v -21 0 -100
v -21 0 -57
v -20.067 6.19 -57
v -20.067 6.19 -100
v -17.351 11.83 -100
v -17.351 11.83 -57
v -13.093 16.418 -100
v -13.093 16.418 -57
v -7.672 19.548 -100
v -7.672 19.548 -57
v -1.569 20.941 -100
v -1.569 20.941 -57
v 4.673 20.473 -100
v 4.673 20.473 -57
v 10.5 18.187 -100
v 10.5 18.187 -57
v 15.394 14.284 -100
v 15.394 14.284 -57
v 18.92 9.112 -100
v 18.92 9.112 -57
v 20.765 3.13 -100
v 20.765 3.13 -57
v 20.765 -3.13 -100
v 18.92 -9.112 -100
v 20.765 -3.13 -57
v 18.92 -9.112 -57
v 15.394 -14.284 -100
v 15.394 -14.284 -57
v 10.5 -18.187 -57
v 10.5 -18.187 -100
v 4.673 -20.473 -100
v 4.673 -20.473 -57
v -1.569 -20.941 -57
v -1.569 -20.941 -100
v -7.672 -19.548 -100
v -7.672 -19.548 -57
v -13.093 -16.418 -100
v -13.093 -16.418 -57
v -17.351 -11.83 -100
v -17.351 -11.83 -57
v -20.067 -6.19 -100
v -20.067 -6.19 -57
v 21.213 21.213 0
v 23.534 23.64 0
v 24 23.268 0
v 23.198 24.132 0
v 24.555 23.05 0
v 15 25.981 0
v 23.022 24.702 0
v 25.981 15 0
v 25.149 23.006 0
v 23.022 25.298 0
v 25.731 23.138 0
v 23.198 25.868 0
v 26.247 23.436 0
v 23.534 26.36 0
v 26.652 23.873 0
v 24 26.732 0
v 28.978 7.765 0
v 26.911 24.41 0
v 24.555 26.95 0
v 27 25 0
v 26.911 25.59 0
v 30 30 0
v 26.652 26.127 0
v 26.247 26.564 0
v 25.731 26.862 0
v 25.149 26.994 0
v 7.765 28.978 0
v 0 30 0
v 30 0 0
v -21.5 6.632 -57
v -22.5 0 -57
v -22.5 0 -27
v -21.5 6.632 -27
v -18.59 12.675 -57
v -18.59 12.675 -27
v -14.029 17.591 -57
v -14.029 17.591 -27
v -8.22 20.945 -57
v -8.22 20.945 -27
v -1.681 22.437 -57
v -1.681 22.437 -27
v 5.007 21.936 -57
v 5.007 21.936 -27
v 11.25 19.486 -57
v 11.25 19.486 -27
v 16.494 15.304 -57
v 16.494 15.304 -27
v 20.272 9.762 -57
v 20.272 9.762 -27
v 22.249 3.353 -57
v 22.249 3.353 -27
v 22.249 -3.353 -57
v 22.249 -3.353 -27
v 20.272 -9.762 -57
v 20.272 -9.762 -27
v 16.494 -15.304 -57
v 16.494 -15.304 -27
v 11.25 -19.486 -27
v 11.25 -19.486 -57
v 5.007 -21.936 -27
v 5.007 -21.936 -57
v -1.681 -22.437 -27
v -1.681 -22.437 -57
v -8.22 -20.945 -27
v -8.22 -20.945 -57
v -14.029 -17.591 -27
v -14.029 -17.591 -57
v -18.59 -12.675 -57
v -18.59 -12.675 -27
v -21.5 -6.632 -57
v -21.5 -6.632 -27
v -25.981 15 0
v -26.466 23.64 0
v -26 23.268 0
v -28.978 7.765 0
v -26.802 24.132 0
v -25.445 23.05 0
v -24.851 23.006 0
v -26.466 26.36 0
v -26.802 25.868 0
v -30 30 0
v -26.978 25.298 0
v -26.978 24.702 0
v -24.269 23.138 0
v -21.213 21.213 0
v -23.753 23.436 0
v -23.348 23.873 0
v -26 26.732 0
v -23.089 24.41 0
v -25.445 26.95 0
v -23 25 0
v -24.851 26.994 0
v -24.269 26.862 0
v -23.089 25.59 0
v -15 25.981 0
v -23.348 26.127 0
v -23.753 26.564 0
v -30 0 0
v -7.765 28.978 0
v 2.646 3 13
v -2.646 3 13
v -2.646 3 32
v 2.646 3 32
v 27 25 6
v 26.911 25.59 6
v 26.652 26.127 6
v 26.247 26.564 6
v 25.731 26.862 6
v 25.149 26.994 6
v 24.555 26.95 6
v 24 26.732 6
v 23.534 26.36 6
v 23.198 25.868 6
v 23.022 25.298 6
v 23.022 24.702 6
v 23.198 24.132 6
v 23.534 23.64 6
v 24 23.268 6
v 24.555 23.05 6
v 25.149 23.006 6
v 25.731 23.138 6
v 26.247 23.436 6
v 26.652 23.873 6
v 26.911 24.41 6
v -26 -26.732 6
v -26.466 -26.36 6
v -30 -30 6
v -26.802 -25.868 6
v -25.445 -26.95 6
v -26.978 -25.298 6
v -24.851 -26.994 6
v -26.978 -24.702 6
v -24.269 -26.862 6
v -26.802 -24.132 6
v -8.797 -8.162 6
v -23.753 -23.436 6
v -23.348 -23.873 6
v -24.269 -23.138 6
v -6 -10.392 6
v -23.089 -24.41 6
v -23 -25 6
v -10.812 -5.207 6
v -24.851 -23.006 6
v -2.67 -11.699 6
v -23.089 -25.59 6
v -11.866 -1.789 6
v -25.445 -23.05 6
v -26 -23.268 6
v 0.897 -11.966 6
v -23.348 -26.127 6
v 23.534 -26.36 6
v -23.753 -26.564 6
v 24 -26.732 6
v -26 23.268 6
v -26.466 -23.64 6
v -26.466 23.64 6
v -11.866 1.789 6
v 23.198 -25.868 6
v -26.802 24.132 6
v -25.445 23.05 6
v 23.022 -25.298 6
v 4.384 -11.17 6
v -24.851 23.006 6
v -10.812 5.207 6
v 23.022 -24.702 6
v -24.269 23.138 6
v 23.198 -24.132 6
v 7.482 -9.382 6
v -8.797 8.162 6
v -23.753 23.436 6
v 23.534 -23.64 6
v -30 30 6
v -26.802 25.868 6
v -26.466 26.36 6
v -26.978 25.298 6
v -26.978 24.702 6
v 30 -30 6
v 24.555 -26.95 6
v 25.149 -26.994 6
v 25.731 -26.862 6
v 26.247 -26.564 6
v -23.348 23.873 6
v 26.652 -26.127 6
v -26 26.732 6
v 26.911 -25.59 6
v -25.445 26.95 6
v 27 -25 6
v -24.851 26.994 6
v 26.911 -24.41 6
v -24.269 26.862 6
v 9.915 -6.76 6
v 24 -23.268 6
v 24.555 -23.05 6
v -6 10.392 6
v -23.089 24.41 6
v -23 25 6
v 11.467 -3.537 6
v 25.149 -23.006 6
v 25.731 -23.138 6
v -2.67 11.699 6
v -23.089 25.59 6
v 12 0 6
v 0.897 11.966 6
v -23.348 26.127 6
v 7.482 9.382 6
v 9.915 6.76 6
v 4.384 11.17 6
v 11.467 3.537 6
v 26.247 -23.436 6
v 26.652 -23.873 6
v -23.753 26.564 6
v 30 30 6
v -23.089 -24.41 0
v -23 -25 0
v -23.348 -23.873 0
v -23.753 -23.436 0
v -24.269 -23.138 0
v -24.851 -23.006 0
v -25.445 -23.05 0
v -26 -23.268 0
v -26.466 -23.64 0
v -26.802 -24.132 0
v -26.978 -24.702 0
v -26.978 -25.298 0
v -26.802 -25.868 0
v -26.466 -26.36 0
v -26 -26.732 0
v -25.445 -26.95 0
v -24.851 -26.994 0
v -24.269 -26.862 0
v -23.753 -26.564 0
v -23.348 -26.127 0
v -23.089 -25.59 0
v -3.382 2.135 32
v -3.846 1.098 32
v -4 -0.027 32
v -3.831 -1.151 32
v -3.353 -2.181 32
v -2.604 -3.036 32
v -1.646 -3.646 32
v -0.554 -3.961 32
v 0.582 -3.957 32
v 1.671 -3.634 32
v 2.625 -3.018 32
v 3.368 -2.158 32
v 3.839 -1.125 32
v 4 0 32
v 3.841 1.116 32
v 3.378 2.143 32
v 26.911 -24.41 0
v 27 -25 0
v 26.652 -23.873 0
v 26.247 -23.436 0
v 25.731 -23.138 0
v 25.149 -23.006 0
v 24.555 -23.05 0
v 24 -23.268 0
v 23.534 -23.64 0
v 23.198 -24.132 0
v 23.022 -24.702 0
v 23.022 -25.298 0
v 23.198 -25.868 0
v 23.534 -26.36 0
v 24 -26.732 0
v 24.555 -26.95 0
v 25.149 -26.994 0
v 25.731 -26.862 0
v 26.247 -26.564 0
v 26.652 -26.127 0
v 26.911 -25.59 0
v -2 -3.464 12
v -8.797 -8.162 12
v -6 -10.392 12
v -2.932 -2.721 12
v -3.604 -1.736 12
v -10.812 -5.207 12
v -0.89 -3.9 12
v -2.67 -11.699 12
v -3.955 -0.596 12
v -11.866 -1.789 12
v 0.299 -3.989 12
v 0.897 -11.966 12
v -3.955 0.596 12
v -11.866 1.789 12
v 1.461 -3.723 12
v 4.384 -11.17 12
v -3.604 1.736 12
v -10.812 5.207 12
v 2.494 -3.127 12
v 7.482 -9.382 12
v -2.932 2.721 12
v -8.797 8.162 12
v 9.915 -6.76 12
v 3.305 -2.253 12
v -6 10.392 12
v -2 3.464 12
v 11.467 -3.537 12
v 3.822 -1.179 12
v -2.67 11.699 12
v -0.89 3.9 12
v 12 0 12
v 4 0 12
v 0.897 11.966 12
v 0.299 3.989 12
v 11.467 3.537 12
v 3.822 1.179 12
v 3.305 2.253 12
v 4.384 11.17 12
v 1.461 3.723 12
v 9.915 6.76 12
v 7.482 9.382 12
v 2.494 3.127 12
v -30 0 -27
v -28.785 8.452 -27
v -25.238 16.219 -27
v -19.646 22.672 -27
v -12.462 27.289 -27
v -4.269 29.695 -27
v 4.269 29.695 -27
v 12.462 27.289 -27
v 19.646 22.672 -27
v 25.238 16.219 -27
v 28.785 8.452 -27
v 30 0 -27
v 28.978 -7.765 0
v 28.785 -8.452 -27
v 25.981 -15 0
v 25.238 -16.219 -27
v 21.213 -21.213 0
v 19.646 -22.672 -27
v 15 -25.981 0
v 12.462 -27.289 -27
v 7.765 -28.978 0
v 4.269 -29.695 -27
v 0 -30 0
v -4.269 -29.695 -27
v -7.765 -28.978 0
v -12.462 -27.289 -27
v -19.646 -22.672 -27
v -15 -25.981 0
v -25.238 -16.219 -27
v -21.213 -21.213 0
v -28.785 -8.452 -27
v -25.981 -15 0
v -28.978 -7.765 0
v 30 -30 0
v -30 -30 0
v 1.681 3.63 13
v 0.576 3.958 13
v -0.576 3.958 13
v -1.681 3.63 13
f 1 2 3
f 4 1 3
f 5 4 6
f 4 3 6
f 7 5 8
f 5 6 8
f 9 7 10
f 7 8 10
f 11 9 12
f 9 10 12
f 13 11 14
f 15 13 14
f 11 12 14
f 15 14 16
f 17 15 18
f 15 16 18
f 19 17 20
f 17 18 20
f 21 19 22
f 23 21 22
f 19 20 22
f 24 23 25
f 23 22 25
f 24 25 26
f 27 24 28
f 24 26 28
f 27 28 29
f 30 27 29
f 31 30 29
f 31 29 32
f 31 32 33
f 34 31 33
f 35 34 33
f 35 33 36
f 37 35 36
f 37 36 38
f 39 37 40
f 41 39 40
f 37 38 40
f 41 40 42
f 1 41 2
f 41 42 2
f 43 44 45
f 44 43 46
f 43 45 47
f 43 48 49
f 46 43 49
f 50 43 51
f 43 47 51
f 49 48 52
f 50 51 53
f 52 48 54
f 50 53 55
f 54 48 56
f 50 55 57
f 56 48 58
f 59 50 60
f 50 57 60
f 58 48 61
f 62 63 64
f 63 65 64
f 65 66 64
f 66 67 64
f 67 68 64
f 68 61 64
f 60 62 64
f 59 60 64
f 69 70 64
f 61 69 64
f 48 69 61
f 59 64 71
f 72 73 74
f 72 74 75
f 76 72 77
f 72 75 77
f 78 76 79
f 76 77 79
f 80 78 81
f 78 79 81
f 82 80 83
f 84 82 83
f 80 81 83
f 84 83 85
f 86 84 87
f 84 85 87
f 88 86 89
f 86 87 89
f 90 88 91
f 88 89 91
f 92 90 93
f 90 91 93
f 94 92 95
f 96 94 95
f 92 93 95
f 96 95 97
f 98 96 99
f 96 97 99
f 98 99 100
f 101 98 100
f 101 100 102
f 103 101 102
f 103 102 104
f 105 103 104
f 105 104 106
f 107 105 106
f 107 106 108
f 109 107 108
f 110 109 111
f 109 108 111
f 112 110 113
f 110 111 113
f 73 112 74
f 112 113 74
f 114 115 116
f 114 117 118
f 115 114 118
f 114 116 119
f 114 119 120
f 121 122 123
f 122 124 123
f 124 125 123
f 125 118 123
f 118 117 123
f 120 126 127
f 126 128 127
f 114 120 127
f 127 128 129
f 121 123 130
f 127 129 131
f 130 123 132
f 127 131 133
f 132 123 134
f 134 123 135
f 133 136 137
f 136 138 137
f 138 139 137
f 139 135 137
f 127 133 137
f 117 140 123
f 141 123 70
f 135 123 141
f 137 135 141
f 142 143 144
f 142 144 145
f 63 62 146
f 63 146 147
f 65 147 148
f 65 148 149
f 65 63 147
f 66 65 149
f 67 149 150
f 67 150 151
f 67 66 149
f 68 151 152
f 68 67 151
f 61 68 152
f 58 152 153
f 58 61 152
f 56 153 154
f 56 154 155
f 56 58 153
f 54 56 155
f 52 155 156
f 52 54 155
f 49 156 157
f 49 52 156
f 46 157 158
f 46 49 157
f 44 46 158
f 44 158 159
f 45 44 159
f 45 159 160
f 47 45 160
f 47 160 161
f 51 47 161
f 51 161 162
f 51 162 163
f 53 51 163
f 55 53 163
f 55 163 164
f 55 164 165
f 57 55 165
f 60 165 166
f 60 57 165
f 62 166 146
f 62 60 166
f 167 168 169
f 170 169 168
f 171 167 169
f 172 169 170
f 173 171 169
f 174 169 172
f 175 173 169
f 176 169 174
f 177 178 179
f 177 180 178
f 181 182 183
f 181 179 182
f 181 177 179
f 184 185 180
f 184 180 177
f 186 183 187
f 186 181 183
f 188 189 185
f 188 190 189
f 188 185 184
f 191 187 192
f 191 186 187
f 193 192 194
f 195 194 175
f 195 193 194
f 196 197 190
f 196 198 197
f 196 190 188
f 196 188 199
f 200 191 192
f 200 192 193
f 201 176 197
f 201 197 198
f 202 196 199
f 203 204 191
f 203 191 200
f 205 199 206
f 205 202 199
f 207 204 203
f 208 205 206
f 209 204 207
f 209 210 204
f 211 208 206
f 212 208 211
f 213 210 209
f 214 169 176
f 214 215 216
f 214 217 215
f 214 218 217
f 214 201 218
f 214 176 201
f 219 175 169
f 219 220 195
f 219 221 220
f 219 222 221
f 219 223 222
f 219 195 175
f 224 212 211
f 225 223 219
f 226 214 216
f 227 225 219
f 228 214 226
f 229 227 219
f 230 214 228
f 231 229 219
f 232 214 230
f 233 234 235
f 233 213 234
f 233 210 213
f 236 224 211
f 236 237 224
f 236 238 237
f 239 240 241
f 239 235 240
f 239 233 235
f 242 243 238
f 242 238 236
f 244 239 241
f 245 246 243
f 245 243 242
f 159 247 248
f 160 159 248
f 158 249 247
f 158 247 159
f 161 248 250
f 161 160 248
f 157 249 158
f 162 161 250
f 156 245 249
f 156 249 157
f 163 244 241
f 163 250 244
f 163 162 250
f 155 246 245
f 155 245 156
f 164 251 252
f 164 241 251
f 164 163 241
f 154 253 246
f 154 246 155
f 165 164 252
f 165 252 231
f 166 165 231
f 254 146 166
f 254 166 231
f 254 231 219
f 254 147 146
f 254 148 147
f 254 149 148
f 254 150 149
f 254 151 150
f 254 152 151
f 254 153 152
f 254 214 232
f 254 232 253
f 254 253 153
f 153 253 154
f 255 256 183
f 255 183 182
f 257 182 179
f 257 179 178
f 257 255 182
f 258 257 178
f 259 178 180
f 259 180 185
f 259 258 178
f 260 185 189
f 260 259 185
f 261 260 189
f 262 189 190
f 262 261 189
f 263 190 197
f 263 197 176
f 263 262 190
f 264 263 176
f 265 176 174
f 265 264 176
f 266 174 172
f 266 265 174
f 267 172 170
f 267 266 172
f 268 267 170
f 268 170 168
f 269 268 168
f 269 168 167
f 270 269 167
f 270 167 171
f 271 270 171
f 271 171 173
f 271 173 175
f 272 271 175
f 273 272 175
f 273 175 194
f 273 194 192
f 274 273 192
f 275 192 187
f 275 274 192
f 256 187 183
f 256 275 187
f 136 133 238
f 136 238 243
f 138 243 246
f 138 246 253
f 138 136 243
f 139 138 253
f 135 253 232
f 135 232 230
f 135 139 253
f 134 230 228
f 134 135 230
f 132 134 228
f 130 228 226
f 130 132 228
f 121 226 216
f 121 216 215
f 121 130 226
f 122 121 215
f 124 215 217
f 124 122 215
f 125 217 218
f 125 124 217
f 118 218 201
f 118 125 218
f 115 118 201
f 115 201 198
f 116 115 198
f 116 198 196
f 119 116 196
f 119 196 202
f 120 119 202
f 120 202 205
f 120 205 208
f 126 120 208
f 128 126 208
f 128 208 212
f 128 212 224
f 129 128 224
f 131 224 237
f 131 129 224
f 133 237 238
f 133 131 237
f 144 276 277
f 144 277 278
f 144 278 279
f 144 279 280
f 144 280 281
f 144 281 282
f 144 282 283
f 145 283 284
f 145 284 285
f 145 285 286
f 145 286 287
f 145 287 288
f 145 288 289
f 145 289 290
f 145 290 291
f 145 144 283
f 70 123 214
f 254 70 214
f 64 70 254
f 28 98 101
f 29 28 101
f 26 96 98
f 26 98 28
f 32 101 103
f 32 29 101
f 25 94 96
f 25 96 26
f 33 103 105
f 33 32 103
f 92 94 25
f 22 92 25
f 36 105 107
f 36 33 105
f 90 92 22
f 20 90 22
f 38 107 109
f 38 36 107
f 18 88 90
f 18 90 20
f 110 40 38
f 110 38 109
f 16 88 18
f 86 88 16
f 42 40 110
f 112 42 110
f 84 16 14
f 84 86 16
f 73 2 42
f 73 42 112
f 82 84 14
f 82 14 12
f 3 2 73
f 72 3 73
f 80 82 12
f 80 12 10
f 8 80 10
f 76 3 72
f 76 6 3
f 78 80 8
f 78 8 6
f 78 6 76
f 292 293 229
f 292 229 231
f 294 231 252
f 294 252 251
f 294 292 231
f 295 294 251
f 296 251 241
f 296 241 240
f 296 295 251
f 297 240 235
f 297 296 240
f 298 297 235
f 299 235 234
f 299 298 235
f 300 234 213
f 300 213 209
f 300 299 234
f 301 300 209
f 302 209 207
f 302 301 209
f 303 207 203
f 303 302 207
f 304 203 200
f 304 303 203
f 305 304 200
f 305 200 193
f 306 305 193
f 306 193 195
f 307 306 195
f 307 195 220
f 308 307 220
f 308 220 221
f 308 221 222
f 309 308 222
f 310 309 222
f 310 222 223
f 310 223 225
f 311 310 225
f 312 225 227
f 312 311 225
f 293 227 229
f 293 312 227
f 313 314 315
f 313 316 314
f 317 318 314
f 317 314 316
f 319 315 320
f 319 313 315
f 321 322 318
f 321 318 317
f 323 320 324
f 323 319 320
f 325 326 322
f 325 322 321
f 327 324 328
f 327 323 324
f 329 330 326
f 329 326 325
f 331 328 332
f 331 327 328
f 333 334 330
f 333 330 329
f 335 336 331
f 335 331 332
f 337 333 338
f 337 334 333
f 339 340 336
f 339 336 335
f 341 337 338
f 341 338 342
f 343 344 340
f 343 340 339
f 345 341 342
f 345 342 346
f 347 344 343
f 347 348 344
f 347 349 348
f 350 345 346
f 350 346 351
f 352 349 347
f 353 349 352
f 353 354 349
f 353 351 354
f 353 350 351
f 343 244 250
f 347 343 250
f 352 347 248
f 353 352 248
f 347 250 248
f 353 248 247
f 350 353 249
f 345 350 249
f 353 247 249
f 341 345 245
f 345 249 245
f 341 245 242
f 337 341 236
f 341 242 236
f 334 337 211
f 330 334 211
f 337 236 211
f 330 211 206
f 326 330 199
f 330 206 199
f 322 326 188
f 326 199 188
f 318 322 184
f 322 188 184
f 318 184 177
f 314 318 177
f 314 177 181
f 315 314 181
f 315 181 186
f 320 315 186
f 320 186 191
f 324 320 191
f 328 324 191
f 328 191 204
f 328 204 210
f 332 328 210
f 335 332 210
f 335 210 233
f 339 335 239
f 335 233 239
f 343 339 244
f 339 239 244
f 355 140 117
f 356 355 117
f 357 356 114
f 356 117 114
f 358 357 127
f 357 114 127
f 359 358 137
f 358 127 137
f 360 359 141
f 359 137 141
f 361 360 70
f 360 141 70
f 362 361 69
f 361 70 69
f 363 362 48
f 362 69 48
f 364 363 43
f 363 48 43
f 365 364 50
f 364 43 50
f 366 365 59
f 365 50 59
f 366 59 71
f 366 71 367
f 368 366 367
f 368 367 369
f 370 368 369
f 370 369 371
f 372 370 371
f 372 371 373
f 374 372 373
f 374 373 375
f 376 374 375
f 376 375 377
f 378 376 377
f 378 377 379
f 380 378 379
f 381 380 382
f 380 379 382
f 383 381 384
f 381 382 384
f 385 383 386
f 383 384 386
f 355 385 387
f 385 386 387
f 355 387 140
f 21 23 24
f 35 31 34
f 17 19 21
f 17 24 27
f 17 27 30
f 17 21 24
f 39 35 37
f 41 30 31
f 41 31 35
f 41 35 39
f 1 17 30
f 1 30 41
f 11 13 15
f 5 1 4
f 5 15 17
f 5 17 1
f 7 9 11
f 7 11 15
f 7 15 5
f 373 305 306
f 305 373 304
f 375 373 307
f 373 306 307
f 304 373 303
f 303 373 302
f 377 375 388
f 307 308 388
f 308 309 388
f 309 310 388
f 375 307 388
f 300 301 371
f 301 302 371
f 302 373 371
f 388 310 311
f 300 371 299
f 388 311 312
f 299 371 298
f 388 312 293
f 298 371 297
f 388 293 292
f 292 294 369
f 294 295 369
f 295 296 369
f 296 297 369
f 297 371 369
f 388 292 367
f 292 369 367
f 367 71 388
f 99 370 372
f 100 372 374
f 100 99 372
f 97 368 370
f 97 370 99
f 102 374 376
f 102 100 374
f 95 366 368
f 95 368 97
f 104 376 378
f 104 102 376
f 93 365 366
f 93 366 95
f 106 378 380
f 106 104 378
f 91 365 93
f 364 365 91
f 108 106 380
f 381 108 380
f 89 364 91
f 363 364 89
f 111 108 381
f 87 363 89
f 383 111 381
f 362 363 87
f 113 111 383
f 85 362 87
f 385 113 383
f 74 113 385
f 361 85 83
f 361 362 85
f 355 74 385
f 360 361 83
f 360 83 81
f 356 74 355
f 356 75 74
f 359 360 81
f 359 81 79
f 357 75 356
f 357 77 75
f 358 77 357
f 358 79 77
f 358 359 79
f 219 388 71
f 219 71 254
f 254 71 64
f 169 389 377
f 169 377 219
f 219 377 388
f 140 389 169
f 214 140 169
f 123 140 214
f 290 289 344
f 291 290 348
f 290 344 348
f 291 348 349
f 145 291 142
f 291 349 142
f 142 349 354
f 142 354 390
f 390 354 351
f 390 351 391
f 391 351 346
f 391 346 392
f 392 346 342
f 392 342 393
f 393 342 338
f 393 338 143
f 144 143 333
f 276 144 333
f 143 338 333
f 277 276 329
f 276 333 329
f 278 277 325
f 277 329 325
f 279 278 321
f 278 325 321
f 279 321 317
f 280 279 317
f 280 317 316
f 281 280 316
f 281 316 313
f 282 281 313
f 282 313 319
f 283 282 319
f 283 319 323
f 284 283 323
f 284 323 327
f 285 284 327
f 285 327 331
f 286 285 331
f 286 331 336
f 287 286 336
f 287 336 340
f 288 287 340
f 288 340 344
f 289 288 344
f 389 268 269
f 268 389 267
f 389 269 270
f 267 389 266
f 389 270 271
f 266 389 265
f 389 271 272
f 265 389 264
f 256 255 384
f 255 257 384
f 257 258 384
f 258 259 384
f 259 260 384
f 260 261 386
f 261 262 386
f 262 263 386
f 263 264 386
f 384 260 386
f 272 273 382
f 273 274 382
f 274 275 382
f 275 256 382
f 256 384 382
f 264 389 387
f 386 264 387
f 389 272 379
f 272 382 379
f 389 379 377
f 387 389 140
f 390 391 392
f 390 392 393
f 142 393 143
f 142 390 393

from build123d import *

# Parameters (mm, degrees)
SKETCH1_W           = 60
SKETCH1_H           = 60
SKETCH1_R           = 2
BOSS_EXTRUDE1_DEPTH = 6
SKETCH2_R           = 12
BOSS_EXTRUDE2_DEPTH = 6
SKETCH3_R           = 4
BOSS_EXTRUDE3_DEPTH = 20
CUT_EXTRUDE1_START  = -19
CUT_EXTRUDE1_DEPTH  = 19
SKETCH5_R           = 30
BOSS_EXTRUDE4_DEPTH = 27
SKETCH6_R           = 22.5
BOSS_EXTRUDE5_DEPTH = 30
SKETCH7_R           = 21
BOSS_EXTRUDE6_DEPTH = 43


with BuildPart() as part:
    # Sketch1 → Boss-Extrude1 (new body)
    with BuildSketch(Plane.XY):
        Rectangle(SKETCH1_W, SKETCH1_H)
        with Locations((-25, 25)):
            Circle(SKETCH1_R, mode=Mode.SUBTRACT)
        with Locations((25, 25)):
            Circle(SKETCH1_R, mode=Mode.SUBTRACT)
        with Locations((-25, -25)):
            Circle(SKETCH1_R, mode=Mode.SUBTRACT)
        with Locations((25, -25)):
            Circle(SKETCH1_R, mode=Mode.SUBTRACT)
    extrude(amount=BOSS_EXTRUDE1_DEPTH)

    # Sketch2 → Boss-Extrude2 (add)
    with BuildSketch(Plane.XY.offset(6)):
        Circle(SKETCH2_R)
    extrude(amount=BOSS_EXTRUDE2_DEPTH)

    # Sketch3 → Boss-Extrude3 (add)
    with BuildSketch(Plane.XY.offset(12)):
        Circle(SKETCH3_R)
    extrude(amount=BOSS_EXTRUDE3_DEPTH)

    # Sketch4 → Cut-Extrude1 (cut)
    with BuildSketch(Plane.XY.offset(32).offset(CUT_EXTRUDE1_START)):
        with BuildLine():
            Line((-2.645751311, 3), (2.645751311, 3))
            ThreePointArc((2.645751311, 3), (0, 4), (-2.645751311, 3))
        make_face()
    extrude(amount=CUT_EXTRUDE1_DEPTH, mode=Mode.SUBTRACT)

    # Sketch5 → Boss-Extrude4 (add)
    with BuildSketch(Plane(origin=(0, 0, 0), x_dir=(-1, 0, 0), z_dir=(0, 0, -1))):
        Circle(SKETCH5_R)
    extrude(amount=BOSS_EXTRUDE4_DEPTH)

    # Sketch6 → Boss-Extrude5 (add)
    with BuildSketch(Plane(origin=(0, 0, -27), x_dir=(-1, 0, 0), z_dir=(0, 0, -1))):
        Circle(SKETCH6_R)
    extrude(amount=BOSS_EXTRUDE5_DEPTH)

    # Sketch7 → Boss-Extrude6 (add)
    with BuildSketch(Plane(origin=(0, 0, -57), x_dir=(-1, 0, 0), z_dir=(0, 0, -1))):
        Circle(SKETCH7_R)
    extrude(amount=BOSS_EXTRUDE6_DEPTH)


solid = part.part
